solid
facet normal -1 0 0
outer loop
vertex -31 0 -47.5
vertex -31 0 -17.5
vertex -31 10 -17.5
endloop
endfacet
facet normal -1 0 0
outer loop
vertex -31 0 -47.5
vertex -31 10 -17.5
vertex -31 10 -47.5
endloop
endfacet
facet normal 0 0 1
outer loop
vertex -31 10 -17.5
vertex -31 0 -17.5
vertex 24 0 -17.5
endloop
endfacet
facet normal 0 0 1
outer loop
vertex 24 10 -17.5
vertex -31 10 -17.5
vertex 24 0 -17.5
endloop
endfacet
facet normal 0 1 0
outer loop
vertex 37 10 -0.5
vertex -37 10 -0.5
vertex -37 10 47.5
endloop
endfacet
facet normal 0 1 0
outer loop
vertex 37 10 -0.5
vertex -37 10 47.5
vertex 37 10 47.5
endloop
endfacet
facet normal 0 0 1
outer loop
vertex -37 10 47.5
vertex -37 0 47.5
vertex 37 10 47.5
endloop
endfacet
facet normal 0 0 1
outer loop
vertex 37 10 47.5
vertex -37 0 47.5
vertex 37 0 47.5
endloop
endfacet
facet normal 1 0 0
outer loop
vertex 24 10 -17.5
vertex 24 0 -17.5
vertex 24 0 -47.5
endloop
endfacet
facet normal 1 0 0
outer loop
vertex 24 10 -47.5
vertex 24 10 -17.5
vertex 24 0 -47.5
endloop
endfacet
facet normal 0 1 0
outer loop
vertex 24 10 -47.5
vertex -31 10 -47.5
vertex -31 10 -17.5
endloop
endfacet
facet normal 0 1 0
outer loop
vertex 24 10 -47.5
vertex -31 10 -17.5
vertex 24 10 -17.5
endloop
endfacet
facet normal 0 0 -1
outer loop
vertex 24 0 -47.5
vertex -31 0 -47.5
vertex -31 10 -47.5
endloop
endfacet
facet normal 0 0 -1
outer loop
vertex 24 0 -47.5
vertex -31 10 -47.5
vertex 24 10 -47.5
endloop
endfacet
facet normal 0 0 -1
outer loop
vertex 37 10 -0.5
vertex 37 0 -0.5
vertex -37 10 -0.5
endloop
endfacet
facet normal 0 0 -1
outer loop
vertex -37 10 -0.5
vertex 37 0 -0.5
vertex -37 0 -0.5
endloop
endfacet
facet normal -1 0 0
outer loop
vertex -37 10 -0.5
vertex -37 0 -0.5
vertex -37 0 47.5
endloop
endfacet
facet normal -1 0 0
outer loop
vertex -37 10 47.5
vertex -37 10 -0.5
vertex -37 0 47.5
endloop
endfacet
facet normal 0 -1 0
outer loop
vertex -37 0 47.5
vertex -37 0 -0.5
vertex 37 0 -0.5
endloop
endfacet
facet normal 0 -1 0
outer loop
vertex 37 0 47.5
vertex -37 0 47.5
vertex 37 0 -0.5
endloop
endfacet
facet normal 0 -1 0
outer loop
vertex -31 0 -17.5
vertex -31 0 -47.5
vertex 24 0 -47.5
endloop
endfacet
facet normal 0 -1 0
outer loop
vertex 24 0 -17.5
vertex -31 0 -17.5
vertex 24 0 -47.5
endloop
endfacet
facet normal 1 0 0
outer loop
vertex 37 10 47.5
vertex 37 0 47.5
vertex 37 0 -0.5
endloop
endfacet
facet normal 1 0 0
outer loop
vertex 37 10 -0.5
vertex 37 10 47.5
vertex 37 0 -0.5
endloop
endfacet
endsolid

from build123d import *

# Parameters (mm, degrees)
BOSS_EXTRUDE1_DEPTH   = 10
SKETCH1_W             = 55
SKETCH1_H             = 30
BOSS_EXTRUDE1_2_DEPTH = 10


with BuildPart() as part:
    # Sketch1 → Boss-Extrude1 (new body)
    with BuildSketch(Plane(origin=(0, 0, 0), x_dir=(1, 0, 0), z_dir=(0, 1, 0))):
        Polygon((24, 0.5), (-31, 0.5), (-37, 0.5), (-37, -47.5), (37, -47.5), (37, 0.5), align=None)
    extrude(amount=BOSS_EXTRUDE1_DEPTH)


with BuildPart() as body_2:
    # Sketch1 → Boss-Extrude1 2 (new body)
    with BuildSketch(Plane(origin=(0, 0, 0), x_dir=(1, 0, 0), z_dir=(0, 1, 0))):
        with Locations((-3.5, 32.5)):
            Rectangle(SKETCH1_W, SKETCH1_H)
    extrude(amount=BOSS_EXTRUDE1_2_DEPTH)


solid = Compound([part.part, body_2.part])
